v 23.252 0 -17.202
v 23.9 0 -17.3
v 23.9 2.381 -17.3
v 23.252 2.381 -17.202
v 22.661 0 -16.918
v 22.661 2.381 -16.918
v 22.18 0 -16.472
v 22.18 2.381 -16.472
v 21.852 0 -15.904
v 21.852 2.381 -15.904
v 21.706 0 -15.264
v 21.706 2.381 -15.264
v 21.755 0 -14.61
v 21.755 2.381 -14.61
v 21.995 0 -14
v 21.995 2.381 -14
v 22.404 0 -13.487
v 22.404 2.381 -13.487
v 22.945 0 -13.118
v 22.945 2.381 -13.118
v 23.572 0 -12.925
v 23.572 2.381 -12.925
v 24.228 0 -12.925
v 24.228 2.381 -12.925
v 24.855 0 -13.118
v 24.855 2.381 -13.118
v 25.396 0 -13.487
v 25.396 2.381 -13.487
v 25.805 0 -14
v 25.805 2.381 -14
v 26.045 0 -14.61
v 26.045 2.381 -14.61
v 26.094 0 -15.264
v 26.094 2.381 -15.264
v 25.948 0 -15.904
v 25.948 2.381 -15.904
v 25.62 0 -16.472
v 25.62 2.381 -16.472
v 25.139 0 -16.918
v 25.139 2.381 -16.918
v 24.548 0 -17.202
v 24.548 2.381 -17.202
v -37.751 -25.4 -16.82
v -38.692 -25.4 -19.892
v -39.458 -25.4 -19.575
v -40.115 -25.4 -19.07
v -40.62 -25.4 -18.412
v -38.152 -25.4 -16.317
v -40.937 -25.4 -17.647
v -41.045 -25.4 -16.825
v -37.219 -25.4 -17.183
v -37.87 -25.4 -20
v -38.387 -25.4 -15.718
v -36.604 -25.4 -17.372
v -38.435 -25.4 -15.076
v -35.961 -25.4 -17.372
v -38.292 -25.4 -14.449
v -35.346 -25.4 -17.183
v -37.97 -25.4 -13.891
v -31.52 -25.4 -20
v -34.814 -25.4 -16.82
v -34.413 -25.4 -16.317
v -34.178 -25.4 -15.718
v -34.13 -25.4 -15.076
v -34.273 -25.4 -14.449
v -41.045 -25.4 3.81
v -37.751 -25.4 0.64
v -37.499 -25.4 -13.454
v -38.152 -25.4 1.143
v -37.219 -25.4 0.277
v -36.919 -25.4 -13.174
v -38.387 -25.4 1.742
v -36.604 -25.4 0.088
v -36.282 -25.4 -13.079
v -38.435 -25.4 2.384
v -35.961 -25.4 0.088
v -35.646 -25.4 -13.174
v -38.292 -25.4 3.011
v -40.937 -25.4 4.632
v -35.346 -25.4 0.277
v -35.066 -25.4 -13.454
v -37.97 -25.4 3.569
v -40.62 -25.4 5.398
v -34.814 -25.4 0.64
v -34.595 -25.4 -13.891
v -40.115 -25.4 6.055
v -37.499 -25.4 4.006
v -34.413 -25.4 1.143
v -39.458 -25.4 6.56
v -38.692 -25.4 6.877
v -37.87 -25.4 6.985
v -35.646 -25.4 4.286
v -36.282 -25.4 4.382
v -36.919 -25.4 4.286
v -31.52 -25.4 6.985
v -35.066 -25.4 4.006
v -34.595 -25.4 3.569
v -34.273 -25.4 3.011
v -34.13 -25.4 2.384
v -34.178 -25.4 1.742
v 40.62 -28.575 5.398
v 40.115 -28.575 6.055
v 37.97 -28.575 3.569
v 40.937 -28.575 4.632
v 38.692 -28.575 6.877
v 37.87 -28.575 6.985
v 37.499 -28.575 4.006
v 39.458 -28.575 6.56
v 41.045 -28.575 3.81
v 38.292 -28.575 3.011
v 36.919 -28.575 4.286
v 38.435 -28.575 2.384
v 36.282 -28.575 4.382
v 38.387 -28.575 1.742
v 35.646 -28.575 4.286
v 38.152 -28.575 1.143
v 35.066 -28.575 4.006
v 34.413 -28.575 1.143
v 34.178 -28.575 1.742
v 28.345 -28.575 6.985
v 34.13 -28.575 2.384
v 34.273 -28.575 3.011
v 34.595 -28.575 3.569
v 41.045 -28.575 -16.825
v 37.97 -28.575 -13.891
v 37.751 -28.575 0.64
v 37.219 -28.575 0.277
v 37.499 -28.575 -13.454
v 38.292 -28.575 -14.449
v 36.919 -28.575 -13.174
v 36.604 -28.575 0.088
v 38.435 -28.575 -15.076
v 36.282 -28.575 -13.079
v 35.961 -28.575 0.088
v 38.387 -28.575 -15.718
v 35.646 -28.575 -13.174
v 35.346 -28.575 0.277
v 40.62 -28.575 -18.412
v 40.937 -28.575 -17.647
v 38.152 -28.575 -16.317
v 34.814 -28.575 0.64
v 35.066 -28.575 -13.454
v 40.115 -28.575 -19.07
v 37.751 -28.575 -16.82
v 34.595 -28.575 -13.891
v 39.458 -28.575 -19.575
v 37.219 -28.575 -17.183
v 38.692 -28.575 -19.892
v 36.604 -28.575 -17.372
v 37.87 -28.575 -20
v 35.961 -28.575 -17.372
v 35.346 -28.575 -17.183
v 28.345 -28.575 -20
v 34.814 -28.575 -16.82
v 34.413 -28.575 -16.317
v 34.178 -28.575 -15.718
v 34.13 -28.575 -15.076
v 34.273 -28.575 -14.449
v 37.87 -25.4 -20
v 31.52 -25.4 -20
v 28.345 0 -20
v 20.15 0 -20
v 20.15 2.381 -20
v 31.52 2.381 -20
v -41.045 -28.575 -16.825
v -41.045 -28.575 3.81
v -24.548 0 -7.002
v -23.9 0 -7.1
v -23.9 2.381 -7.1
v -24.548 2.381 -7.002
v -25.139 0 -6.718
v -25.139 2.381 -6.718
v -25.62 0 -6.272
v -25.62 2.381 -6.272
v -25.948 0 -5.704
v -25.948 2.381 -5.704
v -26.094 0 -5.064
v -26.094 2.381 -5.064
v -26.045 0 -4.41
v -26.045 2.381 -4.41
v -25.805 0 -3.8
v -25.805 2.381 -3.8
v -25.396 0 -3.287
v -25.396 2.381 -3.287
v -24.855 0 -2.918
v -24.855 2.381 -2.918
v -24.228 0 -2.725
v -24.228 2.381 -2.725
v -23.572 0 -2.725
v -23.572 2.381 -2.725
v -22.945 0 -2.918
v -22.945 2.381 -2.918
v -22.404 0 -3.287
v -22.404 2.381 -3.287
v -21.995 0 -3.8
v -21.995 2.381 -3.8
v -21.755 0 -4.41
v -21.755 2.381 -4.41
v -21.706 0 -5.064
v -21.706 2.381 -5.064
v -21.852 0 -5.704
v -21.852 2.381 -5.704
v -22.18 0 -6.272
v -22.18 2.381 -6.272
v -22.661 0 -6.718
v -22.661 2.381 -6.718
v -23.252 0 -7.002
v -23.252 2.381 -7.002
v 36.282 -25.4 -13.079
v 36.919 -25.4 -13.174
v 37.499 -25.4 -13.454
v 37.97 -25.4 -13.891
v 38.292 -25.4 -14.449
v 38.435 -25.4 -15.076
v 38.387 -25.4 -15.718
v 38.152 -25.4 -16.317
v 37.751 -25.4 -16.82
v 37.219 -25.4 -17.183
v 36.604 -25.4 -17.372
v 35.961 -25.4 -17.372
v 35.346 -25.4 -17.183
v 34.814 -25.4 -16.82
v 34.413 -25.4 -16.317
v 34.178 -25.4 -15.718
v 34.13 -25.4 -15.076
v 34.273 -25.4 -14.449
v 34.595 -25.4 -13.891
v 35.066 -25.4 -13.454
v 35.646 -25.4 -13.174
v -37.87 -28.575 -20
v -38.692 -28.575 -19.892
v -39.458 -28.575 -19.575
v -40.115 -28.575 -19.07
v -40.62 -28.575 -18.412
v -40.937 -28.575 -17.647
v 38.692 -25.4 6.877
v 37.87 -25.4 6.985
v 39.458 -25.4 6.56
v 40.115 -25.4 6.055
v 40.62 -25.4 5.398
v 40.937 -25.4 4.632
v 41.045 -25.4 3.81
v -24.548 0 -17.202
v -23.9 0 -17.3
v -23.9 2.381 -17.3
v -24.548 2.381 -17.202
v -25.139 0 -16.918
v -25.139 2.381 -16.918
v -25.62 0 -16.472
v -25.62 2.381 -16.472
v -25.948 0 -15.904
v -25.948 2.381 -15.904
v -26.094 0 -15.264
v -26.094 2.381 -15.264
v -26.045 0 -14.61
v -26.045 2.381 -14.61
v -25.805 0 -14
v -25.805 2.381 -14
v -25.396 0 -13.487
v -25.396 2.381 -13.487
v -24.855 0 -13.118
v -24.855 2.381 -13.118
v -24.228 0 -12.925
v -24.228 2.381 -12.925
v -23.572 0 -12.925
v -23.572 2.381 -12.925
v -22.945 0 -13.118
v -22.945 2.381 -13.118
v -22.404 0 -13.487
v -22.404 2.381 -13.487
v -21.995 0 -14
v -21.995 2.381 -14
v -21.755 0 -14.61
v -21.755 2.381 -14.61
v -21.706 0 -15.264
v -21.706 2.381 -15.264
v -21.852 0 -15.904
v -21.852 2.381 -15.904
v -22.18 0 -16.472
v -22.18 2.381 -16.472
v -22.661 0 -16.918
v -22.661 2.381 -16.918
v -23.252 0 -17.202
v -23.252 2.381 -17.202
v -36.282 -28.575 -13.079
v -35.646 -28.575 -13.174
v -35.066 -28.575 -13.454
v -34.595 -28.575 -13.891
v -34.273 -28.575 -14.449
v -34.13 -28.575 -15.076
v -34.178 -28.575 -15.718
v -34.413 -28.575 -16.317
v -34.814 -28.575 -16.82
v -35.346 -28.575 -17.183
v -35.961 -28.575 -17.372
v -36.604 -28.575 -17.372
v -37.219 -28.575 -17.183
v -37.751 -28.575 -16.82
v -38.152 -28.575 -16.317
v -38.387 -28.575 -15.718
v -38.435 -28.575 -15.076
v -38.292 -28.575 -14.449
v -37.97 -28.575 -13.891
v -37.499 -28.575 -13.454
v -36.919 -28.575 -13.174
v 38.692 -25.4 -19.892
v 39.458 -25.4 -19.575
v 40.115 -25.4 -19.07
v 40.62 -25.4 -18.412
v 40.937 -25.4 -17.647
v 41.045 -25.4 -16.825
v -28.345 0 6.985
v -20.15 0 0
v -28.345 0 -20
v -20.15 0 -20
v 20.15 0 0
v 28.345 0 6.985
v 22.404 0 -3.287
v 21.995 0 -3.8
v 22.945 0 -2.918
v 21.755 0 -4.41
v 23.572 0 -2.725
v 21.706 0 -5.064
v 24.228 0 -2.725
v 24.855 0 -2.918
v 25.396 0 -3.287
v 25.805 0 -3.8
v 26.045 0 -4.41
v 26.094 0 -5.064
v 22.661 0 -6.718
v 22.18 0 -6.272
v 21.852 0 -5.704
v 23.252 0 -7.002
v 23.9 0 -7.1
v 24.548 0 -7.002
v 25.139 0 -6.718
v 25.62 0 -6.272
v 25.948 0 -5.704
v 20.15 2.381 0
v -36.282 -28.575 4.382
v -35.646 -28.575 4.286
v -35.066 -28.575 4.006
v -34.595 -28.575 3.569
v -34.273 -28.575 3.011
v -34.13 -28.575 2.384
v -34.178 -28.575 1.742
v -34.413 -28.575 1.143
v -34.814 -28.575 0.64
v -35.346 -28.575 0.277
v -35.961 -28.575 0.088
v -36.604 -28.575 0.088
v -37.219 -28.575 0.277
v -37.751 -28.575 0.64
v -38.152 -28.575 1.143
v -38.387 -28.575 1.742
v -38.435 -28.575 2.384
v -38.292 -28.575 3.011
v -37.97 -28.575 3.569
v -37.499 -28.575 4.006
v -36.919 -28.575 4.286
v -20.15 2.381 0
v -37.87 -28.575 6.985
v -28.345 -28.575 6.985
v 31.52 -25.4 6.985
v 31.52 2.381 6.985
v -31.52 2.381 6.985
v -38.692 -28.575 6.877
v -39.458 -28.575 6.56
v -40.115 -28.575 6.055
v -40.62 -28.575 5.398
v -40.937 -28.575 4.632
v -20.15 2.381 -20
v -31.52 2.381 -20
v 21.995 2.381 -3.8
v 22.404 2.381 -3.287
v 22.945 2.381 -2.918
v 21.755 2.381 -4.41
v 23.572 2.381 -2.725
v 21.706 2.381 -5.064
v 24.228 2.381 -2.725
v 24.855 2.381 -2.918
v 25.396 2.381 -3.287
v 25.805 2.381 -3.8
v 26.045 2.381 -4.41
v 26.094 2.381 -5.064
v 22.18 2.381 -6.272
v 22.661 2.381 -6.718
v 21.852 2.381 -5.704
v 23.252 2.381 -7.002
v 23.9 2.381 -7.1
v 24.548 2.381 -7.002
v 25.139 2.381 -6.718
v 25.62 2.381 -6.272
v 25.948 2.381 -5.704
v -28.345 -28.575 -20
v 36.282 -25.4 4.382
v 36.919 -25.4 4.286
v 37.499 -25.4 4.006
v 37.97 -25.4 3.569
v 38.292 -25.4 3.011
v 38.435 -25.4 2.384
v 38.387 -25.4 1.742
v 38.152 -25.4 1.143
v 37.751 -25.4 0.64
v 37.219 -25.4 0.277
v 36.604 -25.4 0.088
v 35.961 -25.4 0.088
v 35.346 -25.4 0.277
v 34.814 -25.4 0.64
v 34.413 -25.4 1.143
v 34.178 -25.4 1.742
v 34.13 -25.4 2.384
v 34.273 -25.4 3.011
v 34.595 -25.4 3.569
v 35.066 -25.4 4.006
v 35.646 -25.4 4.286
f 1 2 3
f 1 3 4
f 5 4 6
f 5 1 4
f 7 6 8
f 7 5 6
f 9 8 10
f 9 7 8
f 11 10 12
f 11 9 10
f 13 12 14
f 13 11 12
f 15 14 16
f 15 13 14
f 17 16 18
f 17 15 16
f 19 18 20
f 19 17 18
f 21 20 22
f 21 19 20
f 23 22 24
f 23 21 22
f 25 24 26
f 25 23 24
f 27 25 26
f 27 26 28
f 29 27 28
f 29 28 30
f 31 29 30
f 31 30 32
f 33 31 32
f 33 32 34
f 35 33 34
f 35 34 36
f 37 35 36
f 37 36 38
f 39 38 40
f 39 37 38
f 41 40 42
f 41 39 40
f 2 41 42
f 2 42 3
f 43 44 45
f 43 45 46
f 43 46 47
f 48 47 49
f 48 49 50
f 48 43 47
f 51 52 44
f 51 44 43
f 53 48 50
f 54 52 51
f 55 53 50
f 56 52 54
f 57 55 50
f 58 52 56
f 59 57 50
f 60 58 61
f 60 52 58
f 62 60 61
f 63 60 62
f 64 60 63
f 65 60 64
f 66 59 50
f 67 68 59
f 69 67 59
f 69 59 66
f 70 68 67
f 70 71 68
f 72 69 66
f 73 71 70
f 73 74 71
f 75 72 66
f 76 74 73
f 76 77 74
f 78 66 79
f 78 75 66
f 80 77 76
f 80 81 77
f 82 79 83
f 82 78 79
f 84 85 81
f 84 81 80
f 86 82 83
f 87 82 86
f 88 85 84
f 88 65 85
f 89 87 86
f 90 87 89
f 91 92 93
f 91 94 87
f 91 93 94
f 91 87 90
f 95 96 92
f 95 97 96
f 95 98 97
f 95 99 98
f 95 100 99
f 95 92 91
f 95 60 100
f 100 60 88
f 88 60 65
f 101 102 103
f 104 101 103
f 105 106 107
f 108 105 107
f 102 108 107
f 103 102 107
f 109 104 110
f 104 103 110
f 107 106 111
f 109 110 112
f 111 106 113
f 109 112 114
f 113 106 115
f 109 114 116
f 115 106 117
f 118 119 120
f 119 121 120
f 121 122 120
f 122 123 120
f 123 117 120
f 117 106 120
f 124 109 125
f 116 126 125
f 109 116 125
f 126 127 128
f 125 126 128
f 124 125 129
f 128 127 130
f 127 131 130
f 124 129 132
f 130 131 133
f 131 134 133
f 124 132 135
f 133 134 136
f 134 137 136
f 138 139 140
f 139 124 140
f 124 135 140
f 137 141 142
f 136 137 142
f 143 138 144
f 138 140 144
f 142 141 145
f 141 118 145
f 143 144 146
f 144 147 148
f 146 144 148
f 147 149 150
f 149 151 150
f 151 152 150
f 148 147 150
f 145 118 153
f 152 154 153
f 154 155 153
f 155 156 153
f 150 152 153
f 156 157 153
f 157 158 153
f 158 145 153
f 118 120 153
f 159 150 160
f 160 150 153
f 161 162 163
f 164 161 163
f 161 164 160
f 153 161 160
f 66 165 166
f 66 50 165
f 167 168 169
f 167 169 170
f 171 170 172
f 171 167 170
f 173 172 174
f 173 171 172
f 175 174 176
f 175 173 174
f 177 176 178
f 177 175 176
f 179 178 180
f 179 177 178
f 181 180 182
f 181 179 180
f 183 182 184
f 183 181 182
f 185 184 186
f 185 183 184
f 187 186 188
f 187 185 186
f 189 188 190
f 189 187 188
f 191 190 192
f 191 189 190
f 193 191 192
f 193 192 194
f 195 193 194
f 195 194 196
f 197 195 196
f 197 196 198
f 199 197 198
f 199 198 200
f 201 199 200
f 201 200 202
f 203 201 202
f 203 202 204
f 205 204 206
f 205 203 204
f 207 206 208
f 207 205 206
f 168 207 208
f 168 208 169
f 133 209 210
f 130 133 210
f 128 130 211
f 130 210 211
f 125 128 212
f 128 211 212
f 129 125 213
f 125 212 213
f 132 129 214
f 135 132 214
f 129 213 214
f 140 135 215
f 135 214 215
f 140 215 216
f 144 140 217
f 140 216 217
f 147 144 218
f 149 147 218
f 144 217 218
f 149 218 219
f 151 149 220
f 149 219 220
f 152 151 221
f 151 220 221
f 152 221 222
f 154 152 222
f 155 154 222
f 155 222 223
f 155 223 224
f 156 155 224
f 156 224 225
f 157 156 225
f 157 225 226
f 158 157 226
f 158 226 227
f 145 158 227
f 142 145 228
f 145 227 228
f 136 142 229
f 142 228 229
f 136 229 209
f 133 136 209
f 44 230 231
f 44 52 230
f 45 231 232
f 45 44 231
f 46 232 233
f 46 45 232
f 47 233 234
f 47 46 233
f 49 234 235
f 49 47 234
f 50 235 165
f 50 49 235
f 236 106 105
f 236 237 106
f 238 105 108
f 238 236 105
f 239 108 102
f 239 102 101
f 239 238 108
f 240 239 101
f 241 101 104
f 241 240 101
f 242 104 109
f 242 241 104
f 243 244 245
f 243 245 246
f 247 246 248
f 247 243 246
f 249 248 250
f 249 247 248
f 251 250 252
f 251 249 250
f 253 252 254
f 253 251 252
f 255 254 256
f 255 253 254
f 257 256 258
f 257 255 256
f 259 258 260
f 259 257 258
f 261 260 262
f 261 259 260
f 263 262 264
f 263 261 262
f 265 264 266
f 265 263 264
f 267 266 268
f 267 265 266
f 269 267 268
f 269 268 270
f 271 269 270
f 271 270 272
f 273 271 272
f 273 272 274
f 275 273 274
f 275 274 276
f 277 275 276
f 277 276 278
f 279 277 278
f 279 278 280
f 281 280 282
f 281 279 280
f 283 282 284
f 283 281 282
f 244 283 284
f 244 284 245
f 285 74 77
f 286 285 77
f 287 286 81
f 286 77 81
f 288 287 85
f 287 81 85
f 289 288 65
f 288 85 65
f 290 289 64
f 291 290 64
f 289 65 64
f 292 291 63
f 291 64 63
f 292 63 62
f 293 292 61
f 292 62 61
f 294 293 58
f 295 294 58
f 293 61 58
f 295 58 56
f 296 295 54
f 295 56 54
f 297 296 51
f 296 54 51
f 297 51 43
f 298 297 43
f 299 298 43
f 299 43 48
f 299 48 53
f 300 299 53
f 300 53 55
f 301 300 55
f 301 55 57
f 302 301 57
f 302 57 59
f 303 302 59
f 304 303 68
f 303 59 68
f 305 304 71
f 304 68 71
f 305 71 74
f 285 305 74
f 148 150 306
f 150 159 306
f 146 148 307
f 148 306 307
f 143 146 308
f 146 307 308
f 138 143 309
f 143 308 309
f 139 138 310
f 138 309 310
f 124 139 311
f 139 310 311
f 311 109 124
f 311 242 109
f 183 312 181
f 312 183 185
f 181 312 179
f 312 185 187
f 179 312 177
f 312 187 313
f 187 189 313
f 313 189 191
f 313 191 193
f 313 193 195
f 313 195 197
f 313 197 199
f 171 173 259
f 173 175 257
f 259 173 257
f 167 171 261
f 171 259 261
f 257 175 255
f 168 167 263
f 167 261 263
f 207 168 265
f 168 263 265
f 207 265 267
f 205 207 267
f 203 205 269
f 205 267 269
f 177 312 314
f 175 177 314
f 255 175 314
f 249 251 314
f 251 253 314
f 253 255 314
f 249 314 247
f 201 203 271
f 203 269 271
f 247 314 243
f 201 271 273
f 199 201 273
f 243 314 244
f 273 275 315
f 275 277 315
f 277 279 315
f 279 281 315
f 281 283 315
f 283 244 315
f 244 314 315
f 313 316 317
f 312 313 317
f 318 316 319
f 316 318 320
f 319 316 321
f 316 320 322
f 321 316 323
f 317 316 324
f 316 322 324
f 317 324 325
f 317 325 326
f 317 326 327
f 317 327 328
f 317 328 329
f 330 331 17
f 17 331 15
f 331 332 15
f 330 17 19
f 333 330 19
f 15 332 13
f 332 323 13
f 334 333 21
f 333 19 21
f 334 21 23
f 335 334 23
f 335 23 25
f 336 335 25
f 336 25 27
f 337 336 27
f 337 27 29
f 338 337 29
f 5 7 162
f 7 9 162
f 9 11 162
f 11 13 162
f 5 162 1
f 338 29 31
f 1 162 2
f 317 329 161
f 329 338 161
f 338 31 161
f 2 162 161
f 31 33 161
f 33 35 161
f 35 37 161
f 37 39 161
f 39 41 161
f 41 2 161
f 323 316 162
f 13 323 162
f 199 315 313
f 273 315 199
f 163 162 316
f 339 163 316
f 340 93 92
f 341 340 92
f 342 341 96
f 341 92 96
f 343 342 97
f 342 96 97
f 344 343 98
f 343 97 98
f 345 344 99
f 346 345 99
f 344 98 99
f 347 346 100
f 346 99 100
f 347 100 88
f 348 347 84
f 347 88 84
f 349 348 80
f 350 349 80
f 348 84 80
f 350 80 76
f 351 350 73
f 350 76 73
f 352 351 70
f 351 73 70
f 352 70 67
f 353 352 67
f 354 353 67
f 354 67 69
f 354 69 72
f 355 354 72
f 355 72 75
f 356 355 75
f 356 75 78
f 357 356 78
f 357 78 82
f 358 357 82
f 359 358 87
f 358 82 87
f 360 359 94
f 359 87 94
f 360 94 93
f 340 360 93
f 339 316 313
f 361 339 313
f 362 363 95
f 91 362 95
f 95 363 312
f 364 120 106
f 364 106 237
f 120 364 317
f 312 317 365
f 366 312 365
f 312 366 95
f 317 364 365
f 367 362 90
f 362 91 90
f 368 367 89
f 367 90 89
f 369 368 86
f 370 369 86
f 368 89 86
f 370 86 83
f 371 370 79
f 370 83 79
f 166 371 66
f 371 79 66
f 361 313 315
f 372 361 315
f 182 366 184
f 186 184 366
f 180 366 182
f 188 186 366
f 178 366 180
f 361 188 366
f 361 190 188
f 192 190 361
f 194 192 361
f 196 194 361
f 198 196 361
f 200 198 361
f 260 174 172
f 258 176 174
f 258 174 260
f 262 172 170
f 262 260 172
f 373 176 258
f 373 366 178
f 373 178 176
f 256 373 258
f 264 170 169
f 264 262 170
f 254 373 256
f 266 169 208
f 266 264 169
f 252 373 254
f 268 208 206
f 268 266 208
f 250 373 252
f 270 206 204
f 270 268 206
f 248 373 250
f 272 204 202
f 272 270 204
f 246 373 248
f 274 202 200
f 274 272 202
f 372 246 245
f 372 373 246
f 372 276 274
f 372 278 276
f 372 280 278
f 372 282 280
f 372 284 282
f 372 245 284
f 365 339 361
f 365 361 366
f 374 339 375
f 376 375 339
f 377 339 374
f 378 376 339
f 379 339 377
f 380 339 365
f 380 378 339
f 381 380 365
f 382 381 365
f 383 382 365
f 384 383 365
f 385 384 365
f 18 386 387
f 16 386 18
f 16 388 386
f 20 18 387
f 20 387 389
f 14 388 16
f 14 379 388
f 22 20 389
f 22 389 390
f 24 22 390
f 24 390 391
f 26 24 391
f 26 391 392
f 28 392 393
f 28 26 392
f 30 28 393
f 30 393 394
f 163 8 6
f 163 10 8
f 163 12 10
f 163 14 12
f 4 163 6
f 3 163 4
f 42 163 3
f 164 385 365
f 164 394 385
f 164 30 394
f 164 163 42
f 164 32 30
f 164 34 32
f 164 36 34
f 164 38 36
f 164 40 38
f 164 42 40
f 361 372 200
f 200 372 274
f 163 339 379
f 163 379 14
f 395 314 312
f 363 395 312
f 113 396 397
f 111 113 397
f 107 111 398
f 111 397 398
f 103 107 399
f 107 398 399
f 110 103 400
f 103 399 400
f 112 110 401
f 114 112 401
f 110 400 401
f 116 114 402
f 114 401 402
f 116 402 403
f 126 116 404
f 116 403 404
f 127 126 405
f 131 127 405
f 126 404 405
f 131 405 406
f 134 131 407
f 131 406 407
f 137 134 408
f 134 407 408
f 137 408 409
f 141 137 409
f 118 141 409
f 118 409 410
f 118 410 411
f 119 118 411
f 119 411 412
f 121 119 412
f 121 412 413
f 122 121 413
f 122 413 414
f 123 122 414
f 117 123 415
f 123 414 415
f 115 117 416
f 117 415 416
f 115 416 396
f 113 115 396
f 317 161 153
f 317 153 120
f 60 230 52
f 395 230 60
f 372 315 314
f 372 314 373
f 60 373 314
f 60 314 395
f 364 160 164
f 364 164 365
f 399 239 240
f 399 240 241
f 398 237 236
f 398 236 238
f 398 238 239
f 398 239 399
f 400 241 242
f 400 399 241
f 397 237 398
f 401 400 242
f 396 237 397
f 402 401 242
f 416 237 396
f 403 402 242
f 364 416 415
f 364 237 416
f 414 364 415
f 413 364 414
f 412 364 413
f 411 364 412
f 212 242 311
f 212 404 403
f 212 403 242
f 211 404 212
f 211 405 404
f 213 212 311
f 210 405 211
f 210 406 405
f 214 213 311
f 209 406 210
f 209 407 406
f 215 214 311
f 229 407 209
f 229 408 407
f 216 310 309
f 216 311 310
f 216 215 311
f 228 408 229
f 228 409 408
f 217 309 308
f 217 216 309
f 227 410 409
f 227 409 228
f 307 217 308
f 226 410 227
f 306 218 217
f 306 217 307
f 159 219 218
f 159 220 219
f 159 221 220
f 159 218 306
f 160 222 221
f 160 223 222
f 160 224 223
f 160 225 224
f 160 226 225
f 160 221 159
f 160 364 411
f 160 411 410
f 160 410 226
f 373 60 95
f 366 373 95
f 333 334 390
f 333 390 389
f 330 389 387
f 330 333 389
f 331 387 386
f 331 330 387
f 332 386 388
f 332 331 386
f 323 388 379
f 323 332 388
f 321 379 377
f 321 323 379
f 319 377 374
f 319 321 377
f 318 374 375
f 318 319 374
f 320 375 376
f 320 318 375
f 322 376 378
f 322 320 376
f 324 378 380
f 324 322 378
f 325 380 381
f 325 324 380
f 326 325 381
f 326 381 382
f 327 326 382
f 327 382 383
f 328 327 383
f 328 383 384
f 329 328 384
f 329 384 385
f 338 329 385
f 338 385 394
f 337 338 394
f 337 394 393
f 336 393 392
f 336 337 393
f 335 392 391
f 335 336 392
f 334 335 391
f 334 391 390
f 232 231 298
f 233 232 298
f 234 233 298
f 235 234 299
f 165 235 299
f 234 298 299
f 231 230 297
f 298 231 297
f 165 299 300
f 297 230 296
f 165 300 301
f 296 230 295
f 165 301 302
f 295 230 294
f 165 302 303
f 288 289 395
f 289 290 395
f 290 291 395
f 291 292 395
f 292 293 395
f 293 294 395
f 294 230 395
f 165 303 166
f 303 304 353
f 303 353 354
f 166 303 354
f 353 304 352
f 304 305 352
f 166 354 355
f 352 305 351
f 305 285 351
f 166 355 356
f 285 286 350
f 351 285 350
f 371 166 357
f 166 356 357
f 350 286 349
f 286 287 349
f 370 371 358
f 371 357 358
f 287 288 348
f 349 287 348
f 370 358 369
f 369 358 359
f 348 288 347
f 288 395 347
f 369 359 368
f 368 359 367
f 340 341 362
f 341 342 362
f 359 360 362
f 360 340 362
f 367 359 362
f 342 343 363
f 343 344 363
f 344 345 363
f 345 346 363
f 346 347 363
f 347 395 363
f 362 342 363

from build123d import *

# Parameters (mm, degrees)
SKETCH1_R           = 2.2
BOSS_EXTRUDE1_DEPTH = 2.38125
SKETCH2_W           = 3.175
SKETCH2_H           = 26.985
BOSS_EXTRUDE2_DEPTH = 28.575
SKETCH3_W           = 26.985
SKETCH3_H           = 3.175
BOSS_EXTRUDE3_DEPTH = 9.525
SKETCH4_W           = 26.985
SKETCH4_H           = 3.175
BOSS_EXTRUDE4_DEPTH = 9.525
FILLET1_R           = 3.175
SKETCH5_R           = 2.159
CUT_EXTRUDE1_DEPTH  = 3.175


with BuildPart() as part:
    # Sketch1 → Boss-Extrude1 (new body)
    with BuildSketch(Plane(origin=(0, 0, 0), x_dir=(1, 0, 0), z_dir=(0, 1, 0))):
        Polygon((20.15, 0), (-20.15, 0), (-20.15, 20), (-31.52, 20), (-31.52, -6.985), (31.52, -6.985), (31.52, 20), (20.15, 20), align=None)
        with Locations(Location((-23.9, 15.1, 0), (0, 0, 90))):
            Circle(SKETCH1_R, mode=Mode.SUBTRACT)
        with Locations(Location((-23.9, 4.9, 0), (0, 0, 90))):
            Circle(SKETCH1_R, mode=Mode.SUBTRACT)
        with Locations(Location((23.9, 4.9, 0), (0, 0, 90))):
            Circle(SKETCH1_R, mode=Mode.SUBTRACT)
        with Locations(Location((23.9, 15.1, 0), (0, 0, 90))):
            Circle(SKETCH1_R, mode=Mode.SUBTRACT)
    extrude(amount=BOSS_EXTRUDE1_DEPTH)

    # Sketch2 → Boss-Extrude2 (add)
    with BuildSketch(Plane.XZ):
        with Locations((29.9325, -6.5075)):
            Rectangle(SKETCH2_W, SKETCH2_H)
        with Locations((-29.9325, -6.5075)):
            Rectangle(SKETCH2_W, SKETCH2_H)
    extrude(amount=BOSS_EXTRUDE2_DEPTH)

    # Sketch3 → Boss-Extrude3 (add)
    with BuildSketch(Plane(origin=(31.52, 0, 0), x_dir=(0, 0, -1), z_dir=(1, 0, 0))):
        with Locations((6.5075, -26.9875)):
            Rectangle(SKETCH3_W, SKETCH3_H)
    extrude(amount=BOSS_EXTRUDE3_DEPTH)

    # Sketch4 → Boss-Extrude4 (add)
    with BuildSketch(Plane.ZY.offset(31.52)):
        with Locations((-6.5075, -26.9875)):
            Rectangle(SKETCH4_W, SKETCH4_H)
    extrude(amount=BOSS_EXTRUDE4_DEPTH)

    # Fillet1
    fillet1_edges = [part.edges().sort_by_distance(p)[0] for p in [
        (41.045, -26.9875, 6.985),
        (41.045, -26.9875, -20),
        (-41.045, -26.9875, -20),
        (-41.045, -26.9875, 6.985),
    ]]
    fillet(fillet1_edges, radius=FILLET1_R)

    # Sketch5 → Cut-Extrude1 (cut)
    with BuildSketch(Plane(origin=(0, -25.4, 0), x_dir=(1, 0, 0), z_dir=(0, 1, 0))):
        with Locations(Location((36.2825, -2.2225, 0), (0, 0, 270))):
            Circle(SKETCH5_R)
        with Locations(Location((36.2825, 15.2375, 0), (0, 0, 270))):
            Circle(SKETCH5_R)
        with Locations(Location((-36.2825, -2.2225, 0), (0, 0, 270))):
            Circle(SKETCH5_R)
        with Locations(Location((-36.2825, 15.2375, 0), (0, 0, 270))):
            Circle(SKETCH5_R)
    extrude(amount=-CUT_EXTRUDE1_DEPTH, mode=Mode.SUBTRACT)


solid = part.part
